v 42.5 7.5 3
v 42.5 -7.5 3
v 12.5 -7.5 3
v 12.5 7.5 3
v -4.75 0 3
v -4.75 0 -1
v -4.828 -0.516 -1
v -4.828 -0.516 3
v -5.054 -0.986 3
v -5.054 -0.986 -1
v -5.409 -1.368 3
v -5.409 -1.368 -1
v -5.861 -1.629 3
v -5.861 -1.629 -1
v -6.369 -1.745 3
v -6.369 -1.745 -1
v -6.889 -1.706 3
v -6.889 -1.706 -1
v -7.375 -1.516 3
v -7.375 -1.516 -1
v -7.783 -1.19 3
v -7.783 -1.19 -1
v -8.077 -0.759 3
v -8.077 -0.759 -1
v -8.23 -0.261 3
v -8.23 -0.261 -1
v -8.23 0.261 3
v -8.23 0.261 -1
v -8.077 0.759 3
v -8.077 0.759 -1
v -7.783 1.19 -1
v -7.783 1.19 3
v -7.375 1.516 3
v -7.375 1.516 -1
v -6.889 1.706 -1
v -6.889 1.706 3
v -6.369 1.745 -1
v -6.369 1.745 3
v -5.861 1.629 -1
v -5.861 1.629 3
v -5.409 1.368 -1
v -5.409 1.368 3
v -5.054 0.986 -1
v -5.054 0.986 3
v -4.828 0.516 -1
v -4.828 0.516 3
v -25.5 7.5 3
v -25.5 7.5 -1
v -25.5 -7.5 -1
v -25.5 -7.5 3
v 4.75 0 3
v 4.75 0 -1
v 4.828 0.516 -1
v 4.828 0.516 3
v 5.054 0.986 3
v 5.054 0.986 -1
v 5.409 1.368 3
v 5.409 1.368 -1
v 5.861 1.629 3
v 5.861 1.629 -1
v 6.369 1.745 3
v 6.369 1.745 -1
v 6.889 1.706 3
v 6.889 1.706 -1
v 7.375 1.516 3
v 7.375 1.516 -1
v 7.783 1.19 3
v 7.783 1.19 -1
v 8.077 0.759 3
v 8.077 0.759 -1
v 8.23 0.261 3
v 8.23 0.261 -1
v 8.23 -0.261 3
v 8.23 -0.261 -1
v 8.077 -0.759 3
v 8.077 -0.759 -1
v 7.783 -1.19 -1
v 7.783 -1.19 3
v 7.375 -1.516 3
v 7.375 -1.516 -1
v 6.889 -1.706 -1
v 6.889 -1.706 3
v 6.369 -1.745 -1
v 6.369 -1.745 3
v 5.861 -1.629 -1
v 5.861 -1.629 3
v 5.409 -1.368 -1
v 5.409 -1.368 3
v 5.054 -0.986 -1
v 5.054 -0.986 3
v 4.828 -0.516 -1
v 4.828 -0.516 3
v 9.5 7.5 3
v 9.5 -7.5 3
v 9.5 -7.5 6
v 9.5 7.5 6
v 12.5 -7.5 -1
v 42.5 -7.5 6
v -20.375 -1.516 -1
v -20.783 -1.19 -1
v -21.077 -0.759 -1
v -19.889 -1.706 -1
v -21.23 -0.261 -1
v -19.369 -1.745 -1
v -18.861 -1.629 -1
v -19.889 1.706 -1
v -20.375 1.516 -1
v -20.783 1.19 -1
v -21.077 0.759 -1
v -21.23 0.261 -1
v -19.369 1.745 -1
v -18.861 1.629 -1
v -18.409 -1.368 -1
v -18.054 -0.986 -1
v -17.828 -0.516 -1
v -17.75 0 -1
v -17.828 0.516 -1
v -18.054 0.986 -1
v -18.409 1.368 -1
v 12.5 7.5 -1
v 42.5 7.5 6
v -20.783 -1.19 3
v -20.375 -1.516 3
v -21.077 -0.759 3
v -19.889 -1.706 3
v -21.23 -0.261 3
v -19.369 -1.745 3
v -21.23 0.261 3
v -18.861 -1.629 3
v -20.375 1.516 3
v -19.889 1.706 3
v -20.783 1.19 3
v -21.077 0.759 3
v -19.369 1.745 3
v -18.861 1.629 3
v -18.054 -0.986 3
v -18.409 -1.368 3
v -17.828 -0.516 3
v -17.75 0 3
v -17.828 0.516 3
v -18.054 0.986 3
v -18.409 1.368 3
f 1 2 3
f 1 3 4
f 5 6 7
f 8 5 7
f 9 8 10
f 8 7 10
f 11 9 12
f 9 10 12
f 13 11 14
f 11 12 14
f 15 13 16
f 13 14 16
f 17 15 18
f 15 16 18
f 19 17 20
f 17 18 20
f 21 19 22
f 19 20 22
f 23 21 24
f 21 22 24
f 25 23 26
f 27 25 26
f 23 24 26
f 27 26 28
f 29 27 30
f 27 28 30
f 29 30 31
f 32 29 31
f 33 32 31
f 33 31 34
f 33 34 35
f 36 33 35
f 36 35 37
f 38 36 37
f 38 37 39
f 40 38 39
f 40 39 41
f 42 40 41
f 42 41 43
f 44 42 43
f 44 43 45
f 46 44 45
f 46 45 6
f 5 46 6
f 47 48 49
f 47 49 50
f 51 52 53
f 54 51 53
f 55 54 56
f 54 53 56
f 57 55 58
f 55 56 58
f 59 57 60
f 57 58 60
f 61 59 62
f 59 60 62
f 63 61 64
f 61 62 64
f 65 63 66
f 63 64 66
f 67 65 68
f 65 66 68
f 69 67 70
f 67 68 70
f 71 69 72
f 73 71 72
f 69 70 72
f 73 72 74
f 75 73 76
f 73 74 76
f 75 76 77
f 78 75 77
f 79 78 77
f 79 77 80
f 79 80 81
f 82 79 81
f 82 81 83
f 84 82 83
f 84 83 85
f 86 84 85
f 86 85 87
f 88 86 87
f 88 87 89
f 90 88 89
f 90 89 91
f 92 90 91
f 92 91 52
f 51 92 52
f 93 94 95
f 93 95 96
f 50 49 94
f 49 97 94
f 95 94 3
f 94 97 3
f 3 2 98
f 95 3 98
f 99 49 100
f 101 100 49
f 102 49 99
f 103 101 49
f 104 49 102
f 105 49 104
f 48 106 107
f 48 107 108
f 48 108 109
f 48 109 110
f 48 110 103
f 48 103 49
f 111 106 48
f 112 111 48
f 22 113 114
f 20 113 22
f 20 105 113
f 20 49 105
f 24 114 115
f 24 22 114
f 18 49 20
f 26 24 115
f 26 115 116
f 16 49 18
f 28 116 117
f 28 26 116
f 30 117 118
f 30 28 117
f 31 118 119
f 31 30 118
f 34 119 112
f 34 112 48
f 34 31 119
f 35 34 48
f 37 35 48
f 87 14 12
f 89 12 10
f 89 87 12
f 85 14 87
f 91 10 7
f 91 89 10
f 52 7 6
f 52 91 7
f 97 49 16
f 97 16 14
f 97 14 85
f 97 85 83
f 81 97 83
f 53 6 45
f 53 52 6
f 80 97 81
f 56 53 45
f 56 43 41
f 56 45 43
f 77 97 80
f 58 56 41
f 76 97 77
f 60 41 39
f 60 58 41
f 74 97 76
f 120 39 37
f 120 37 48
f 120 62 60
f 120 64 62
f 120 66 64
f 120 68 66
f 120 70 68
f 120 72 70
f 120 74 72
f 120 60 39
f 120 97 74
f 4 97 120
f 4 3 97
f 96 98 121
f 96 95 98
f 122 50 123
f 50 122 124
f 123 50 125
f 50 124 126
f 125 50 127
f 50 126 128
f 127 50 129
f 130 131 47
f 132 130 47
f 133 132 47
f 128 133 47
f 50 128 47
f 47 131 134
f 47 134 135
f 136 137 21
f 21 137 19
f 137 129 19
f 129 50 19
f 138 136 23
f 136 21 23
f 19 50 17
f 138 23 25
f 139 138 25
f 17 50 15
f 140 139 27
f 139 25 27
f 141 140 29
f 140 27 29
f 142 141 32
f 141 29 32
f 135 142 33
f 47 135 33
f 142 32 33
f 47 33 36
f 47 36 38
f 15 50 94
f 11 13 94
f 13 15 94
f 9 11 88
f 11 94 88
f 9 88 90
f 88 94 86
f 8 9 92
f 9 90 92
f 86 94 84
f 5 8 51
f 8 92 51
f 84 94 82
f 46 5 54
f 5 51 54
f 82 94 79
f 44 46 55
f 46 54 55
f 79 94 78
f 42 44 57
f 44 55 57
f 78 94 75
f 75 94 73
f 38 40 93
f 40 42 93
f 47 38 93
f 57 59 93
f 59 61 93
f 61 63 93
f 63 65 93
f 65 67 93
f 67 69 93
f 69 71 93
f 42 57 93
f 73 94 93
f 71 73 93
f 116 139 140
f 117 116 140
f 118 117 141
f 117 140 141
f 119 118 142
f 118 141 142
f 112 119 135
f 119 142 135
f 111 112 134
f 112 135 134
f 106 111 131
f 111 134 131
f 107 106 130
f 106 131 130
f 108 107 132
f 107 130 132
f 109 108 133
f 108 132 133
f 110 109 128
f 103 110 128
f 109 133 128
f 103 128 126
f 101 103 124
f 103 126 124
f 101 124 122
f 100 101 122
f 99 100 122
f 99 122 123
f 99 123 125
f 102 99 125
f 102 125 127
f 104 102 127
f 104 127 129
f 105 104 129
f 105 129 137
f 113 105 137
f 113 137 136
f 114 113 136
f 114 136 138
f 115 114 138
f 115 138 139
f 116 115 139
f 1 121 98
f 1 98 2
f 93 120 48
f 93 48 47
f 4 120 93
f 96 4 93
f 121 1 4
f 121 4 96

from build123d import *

# Parameters (mm, degrees)
ESBO_O1_W                = 25
ESBO_O1_H                = 15
RESSALTO_EXTRUS_O1_DEPTH = 3
ESBO_O3_W                = 3
ESBO_O3_H                = 15
RESSALTO_EXTRUS_O2_DEPTH = 3
ESBO_O5_W                = 3
ESBO_O5_H                = 15
RESSALTO_EXTRUS_O3_DEPTH = 30
ESBO_O8_W                = 25
ESBO_O8_H                = 15
RESSALTO_EXTRUS_O4_DEPTH = 1
ESBO_O9_R                = 1.75
CORTE_EXTRUS_O1_DEPTH    = 44.720704477
ESBO_O10_W               = 4
ESBO_O10_H               = 15
RESSALTO_EXTRUS_O5_DEPTH = 13
ESBO_O11_R               = 1.75
CORTE_EXTRUS_O2_DEPTH    = 44.341665866


with BuildPart() as part:
    # Esboço1 → Ressalto-extrusão1 (new body)
    with BuildSketch(Plane.XY):
        Rectangle(ESBO_O1_W, ESBO_O1_H)
    extrude(amount=RESSALTO_EXTRUS_O1_DEPTH)

    # Esboço3 → Ressalto-extrusão2 (add)
    with BuildSketch(Plane.XY.offset(3)):
        with Locations((11, 0)):
            Rectangle(ESBO_O3_W, ESBO_O3_H)
    extrude(amount=RESSALTO_EXTRUS_O2_DEPTH)

    # Esboço5 → Ressalto-extrusão3 (add)
    with BuildSketch(Plane(origin=(12.5, 0, 0), x_dir=(0, 0, -1), z_dir=(1, 0, 0))):
        with Locations((-4.5, 0)):
            Rectangle(ESBO_O5_W, ESBO_O5_H)
    extrude(amount=RESSALTO_EXTRUS_O3_DEPTH)

    # Esboço8 → Ressalto-extrusão4 (add)
    with BuildSketch(Plane(origin=(0, 0, 0), x_dir=(-1, 0, 0), z_dir=(0, 0, -1))):
        Rectangle(ESBO_O8_W, ESBO_O8_H)
    extrude(amount=RESSALTO_EXTRUS_O4_DEPTH)

    # Esboço9 → Corte-extrusão1 (cut, through all)
    with BuildSketch(Plane(origin=(0, 0, -1), x_dir=(-1, 0, 0), z_dir=(0, 0, -1))):
        with Locations((-6.5, 0)):
            Circle(ESBO_O9_R)
        with Locations(Location((6.5, 0, 0), (0, 0, 180))):
            Circle(ESBO_O9_R)
    extrude(amount=-CORTE_EXTRUS_O1_DEPTH, mode=Mode.SUBTRACT)

    # Esboço10 → Ressalto-extrusão5 (add)
    with BuildSketch(Plane.ZY.offset(12.5)):
        with Locations((1, 0)):
            Rectangle(ESBO_O10_W, ESBO_O10_H)
    extrude(amount=RESSALTO_EXTRUS_O5_DEPTH)

    # Esboço11 → Corte-extrusão2 (cut, through all)
    with BuildSketch(Plane.XY.offset(3)):
        with Locations((-19.5, 0)):
            Circle(ESBO_O11_R)
    extrude(amount=-CORTE_EXTRUS_O2_DEPTH, mode=Mode.SUBTRACT)


solid = part.part
